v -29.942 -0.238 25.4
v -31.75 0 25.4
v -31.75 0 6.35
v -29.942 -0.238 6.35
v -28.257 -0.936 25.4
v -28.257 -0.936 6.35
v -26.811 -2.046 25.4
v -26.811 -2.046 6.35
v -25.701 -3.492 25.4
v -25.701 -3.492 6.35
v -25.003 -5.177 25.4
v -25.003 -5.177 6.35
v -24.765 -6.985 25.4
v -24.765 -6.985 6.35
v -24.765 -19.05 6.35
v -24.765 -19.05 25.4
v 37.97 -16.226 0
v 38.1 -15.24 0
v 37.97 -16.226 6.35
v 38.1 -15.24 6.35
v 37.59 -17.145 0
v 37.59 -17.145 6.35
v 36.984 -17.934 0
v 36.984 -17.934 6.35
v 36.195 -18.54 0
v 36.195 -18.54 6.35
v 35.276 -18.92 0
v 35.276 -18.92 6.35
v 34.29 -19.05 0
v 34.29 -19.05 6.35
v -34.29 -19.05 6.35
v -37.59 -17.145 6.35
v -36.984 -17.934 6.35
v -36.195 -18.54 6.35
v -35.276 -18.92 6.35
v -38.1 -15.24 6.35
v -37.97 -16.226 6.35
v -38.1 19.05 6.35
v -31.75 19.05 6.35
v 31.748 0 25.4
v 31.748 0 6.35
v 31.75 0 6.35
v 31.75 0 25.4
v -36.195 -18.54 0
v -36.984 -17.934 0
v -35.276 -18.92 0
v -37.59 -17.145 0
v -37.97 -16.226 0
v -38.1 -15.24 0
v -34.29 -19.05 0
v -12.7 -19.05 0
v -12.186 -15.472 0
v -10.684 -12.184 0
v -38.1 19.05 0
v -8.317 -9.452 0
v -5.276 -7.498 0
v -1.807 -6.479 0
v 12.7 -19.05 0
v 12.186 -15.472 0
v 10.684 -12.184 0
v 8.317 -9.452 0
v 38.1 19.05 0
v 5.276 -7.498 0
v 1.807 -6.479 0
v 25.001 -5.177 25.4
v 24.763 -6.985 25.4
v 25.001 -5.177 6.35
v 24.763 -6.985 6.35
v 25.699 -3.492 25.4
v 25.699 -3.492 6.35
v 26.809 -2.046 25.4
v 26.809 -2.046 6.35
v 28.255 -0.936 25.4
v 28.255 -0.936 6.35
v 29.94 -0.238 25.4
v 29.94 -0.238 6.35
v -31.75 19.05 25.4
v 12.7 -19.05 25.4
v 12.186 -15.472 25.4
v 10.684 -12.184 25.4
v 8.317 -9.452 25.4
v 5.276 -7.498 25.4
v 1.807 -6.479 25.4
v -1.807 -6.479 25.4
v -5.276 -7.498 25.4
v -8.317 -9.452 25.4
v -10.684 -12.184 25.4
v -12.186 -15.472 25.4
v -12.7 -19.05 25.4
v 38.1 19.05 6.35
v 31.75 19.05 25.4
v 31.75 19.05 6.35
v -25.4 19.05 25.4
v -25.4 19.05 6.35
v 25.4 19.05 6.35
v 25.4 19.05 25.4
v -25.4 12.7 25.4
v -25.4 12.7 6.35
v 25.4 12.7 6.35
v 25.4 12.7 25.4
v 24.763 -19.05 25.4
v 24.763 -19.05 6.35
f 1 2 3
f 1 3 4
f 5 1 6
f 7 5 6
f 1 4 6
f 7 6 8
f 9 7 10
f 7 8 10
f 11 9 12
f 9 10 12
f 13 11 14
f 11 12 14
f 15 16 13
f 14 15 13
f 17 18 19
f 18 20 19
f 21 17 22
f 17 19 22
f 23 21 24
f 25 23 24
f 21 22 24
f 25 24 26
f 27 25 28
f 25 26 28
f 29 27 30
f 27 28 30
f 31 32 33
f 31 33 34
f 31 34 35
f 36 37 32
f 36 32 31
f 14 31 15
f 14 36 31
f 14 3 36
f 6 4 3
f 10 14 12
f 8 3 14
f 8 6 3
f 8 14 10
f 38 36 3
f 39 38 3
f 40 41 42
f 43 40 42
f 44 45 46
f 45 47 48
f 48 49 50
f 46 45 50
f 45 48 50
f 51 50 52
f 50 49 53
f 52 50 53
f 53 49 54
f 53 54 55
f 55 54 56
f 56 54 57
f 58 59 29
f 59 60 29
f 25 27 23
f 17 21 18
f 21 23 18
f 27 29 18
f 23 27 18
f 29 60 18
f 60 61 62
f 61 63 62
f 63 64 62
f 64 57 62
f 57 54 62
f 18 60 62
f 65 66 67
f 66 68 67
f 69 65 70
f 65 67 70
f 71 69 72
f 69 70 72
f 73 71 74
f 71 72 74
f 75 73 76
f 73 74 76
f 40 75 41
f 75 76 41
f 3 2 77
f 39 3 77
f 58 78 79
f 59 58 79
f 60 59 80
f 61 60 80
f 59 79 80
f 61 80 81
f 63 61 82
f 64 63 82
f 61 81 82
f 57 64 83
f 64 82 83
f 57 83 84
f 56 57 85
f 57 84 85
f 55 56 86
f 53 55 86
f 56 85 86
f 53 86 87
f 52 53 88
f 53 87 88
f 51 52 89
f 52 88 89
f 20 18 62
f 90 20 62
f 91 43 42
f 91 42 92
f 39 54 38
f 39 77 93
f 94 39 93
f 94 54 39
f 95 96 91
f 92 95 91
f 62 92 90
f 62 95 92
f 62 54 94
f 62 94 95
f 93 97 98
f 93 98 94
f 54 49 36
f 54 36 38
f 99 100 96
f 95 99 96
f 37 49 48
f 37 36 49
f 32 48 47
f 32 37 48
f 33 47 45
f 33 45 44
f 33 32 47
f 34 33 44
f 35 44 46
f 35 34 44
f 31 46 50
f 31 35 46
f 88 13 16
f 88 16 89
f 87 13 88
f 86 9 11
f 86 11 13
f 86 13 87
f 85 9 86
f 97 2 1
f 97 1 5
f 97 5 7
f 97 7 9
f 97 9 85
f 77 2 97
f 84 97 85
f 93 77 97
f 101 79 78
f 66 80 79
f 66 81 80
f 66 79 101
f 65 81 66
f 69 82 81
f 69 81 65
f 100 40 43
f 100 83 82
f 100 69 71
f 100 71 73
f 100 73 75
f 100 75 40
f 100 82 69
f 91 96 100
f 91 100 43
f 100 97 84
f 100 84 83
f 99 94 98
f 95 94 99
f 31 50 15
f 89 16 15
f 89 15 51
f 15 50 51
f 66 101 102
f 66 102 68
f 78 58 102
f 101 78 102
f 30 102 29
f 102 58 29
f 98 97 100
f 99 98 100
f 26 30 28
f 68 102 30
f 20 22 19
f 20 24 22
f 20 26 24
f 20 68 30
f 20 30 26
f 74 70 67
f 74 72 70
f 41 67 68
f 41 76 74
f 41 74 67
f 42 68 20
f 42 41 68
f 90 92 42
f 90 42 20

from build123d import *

# Parameters (mm, degrees)
F0_W      = 76.2
F0_H      = 38.1
F1_DEPTH  = 25.4
F2_W      = 50.8
F2_H      = 6.35
F3_DEPTH  = 19.05
F4_W      = 6.35
F4_H      = 38.1
F5_DEPTH  = 19.05
F7_DEPTH  = 25.4
F8_R      = 3.81
F9_W      = 6.985
F9_H      = 19.05
F9_W_2    = 6.9872894436
F10_DEPTH = 19.05
F11_R     = 6.98499


# Not quite as in the source:
# - a fillet or chamfer is up to 0.001 mm smaller than in the source, because OpenCascade refuses the exact size
# - a feature of the source that left no trace in its solid (it failed there, or was rolled back) is left out


with BuildPart() as f1:
    # F0 (on Top) → F1 (new body)
    with BuildSketch(Plane.XY):
        Rectangle(F0_W, F0_H)
    extrude(amount=F1_DEPTH)

    # F2 (on face) → F3 (cut)
    with BuildSketch(Plane.XY.offset(25.4)):
        with Locations((0, 15.875)):
            Rectangle(F2_W, F2_H)
    extrude(amount=-F3_DEPTH, mode=Mode.SUBTRACT)

    # F4 (on face) → F5 (cut)
    with BuildSketch(Plane.XY.offset(25.4)):
        with Locations((-34.925, 0)):
            Rectangle(F4_W, F4_H)
        with Locations((34.925, 0)):
            Rectangle(F4_W, F4_H)
    extrude(amount=-F5_DEPTH, mode=Mode.SUBTRACT)

    # F6 (on face) → F7 (cut)
    with BuildSketch(Plane.XY.offset(25.4)):
        with BuildLine():
            Line((-12.7, -19.05), (12.7, -19.05))
            ThreePointArc((12.7, -19.05), (0, -6.35), (-12.7, -19.05))
        make_face()
    extrude(amount=-F7_DEPTH, mode=Mode.SUBTRACT)

    # F8
    f8_edges = [f1.edges().sort_by_distance(p)[0] for p in [
        (38.1, -19.05, 3.175),
        (-38.1, -19.05, 3.175),
    ]]
    fillet(f8_edges, radius=F8_R)

    # F9 (on face) → F10 (cut)
    with BuildSketch(Plane.XY.offset(25.4)):
        with Locations((-28.2575, -9.525)):
            Rectangle(F9_W, F9_H)
        with Locations((28.2563552782, -9.525)):
            Rectangle(F9_W_2, F9_H)
    extrude(amount=-F10_DEPTH, mode=Mode.SUBTRACT)

    # F11 (radius 6.985 in the source; OpenCascade refuses exactly that, so slightly less here)
    f11_edges = [f1.edges().sort_by_distance(p)[0] for p in [
        (24.762711, 0, 15.875),
        (-24.765, 0, 15.875),
    ]]
    fillet(f11_edges, radius=F11_R)


solid = f1.part
